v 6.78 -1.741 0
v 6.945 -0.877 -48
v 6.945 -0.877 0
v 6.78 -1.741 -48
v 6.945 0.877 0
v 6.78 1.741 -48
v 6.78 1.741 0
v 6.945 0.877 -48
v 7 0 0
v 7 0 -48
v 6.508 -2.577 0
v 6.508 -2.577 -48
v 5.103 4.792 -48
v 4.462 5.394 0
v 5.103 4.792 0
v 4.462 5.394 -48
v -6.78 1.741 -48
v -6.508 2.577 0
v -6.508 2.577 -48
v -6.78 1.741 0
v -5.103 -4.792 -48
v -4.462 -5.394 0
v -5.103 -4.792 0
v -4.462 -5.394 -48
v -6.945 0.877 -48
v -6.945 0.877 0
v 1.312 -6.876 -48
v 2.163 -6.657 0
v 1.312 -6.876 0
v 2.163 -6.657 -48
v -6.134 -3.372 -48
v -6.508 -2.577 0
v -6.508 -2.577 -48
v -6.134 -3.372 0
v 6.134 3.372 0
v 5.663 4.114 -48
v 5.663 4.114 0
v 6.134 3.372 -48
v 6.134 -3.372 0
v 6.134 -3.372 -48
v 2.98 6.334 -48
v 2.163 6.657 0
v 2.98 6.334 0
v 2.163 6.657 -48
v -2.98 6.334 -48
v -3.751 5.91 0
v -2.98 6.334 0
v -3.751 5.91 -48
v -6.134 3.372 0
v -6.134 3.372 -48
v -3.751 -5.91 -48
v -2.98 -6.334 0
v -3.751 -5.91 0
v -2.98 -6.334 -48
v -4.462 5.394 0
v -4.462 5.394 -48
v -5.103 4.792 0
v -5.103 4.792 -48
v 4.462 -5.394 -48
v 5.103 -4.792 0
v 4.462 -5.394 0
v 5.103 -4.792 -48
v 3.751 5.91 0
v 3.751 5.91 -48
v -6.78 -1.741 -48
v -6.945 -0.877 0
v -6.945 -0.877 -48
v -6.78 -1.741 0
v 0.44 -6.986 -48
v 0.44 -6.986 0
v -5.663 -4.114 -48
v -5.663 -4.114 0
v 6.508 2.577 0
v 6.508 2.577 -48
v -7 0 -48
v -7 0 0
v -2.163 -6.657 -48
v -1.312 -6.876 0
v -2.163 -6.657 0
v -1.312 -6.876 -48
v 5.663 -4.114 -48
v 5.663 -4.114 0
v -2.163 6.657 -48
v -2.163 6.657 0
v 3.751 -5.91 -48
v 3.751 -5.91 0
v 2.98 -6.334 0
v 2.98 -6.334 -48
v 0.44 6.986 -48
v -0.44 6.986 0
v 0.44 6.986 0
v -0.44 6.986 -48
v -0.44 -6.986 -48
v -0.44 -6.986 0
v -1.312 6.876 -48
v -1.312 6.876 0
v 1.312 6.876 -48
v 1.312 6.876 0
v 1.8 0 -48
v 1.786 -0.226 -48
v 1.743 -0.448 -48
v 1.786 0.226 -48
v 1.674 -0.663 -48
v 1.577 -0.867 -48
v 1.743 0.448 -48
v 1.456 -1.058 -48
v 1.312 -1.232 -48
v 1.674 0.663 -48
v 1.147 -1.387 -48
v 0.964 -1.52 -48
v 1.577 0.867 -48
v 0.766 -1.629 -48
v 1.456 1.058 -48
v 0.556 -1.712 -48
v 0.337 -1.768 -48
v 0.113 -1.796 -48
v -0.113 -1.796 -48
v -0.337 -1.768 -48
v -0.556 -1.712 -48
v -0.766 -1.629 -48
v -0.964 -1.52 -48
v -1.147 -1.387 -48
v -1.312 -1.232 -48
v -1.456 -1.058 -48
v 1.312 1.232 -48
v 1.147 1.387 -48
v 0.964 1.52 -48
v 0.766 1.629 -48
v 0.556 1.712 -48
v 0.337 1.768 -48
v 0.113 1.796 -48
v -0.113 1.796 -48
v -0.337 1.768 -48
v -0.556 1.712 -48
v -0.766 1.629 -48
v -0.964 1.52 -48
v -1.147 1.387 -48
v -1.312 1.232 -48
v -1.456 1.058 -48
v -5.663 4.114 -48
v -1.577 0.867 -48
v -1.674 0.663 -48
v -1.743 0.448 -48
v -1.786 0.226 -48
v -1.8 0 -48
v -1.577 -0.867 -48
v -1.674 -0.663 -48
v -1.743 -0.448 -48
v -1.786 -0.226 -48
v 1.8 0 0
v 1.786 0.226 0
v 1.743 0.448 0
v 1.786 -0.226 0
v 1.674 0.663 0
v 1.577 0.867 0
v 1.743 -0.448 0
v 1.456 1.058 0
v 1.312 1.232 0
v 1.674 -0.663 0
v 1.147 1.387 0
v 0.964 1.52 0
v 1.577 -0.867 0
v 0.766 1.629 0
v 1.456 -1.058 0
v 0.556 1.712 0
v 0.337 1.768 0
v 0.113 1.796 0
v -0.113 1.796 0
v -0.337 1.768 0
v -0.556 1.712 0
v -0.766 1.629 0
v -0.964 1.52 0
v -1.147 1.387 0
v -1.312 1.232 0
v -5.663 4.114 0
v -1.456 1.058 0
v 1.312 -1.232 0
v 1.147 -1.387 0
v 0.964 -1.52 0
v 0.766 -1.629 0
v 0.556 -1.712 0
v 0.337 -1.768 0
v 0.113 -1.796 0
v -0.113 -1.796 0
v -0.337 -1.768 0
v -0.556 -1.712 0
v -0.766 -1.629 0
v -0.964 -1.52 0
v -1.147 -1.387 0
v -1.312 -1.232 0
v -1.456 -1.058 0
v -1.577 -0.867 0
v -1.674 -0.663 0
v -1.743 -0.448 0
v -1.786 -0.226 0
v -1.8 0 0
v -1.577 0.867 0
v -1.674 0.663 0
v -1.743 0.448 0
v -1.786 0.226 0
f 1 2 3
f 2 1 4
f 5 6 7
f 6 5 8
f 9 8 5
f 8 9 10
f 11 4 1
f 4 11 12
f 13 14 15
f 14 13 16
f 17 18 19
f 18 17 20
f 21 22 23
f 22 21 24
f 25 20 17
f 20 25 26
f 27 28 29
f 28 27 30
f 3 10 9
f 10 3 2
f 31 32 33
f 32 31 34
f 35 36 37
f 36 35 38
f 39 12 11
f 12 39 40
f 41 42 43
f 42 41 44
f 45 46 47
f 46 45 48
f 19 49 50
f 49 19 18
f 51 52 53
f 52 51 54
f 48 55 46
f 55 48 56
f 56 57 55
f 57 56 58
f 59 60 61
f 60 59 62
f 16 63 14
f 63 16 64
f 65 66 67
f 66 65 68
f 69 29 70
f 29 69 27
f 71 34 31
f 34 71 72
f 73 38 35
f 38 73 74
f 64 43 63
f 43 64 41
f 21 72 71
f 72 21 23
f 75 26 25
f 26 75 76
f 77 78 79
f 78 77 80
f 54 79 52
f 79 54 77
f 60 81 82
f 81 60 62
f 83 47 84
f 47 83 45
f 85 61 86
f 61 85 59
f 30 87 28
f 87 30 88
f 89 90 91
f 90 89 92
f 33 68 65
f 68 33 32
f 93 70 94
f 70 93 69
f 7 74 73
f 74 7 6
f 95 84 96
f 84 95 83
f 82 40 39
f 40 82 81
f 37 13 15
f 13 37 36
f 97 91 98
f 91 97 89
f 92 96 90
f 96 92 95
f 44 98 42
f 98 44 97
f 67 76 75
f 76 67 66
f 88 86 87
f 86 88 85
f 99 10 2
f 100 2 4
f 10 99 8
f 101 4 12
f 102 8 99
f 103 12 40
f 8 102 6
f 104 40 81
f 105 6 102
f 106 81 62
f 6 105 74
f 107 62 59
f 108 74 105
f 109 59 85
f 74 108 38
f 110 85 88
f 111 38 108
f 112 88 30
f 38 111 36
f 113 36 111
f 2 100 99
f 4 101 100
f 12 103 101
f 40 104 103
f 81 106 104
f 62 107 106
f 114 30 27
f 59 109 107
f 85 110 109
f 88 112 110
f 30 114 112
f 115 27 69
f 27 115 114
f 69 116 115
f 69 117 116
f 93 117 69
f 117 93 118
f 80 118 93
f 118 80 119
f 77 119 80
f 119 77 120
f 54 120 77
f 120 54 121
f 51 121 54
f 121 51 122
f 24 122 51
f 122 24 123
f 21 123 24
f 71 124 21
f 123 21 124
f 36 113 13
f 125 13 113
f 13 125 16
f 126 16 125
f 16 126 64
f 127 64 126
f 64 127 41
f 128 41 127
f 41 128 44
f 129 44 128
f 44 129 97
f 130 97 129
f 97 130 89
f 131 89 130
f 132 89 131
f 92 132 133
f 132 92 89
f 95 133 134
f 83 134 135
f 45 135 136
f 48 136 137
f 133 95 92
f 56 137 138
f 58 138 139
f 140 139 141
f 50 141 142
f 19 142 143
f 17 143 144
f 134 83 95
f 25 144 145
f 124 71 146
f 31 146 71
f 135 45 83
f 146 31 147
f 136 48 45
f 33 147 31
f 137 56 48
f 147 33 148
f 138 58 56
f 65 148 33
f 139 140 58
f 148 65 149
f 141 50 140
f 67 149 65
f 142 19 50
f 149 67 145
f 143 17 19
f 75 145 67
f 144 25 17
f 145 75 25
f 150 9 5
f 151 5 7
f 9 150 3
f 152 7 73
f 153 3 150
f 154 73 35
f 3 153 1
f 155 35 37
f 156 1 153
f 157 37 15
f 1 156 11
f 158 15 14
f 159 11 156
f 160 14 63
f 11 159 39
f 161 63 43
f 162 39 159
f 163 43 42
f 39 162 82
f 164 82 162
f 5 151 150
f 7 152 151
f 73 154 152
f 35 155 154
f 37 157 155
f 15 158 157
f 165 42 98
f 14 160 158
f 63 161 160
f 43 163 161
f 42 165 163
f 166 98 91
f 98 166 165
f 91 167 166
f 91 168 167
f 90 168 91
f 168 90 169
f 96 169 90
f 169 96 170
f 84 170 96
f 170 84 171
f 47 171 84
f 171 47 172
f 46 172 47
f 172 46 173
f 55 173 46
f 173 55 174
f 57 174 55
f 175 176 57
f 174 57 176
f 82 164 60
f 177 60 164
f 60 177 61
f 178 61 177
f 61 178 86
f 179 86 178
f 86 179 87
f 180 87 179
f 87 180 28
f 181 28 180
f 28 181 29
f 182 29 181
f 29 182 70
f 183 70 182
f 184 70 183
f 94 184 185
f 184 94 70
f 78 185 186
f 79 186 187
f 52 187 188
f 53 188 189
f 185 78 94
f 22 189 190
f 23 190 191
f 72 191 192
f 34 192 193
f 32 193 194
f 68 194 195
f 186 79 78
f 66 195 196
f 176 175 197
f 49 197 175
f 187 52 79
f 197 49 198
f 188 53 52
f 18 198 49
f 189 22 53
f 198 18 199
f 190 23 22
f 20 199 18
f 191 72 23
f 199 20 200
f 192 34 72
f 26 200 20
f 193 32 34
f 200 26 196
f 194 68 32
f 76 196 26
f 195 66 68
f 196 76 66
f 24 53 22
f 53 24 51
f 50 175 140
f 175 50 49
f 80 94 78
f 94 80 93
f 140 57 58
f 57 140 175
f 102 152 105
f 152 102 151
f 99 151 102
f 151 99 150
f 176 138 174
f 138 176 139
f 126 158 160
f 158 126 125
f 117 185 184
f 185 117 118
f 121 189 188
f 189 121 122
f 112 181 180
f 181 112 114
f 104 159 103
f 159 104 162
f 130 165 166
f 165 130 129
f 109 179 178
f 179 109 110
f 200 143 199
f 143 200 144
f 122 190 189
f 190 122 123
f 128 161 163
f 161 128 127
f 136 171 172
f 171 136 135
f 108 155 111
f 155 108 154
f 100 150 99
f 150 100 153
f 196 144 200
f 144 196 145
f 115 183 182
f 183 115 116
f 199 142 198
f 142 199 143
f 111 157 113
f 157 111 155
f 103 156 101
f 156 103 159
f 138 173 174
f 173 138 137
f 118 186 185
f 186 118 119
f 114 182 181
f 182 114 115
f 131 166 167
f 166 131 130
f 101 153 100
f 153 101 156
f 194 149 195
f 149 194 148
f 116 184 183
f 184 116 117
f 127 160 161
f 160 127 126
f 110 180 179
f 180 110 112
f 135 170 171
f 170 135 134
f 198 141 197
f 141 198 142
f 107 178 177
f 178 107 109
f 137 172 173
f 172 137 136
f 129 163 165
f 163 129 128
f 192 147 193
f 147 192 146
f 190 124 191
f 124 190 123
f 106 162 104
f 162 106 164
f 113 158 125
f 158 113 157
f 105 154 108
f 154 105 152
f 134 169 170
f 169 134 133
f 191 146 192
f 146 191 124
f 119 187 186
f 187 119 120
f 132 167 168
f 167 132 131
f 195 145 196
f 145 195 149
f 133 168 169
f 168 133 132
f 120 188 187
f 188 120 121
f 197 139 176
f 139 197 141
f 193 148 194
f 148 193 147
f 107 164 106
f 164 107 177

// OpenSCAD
$fn = 50;


difference() {
	union() {
		translate(v = [0, 0, -48.0000000000]) {
			cylinder(h = 48, r = 7.0000000000);
		}
		cylinder(h = 0, r = 17.0000000000);
	}
	union() {
		#translate(v = [0, 0, -48]) {
			cylinder(h = 48, r = 1.8000000000);
		}
	}
}
